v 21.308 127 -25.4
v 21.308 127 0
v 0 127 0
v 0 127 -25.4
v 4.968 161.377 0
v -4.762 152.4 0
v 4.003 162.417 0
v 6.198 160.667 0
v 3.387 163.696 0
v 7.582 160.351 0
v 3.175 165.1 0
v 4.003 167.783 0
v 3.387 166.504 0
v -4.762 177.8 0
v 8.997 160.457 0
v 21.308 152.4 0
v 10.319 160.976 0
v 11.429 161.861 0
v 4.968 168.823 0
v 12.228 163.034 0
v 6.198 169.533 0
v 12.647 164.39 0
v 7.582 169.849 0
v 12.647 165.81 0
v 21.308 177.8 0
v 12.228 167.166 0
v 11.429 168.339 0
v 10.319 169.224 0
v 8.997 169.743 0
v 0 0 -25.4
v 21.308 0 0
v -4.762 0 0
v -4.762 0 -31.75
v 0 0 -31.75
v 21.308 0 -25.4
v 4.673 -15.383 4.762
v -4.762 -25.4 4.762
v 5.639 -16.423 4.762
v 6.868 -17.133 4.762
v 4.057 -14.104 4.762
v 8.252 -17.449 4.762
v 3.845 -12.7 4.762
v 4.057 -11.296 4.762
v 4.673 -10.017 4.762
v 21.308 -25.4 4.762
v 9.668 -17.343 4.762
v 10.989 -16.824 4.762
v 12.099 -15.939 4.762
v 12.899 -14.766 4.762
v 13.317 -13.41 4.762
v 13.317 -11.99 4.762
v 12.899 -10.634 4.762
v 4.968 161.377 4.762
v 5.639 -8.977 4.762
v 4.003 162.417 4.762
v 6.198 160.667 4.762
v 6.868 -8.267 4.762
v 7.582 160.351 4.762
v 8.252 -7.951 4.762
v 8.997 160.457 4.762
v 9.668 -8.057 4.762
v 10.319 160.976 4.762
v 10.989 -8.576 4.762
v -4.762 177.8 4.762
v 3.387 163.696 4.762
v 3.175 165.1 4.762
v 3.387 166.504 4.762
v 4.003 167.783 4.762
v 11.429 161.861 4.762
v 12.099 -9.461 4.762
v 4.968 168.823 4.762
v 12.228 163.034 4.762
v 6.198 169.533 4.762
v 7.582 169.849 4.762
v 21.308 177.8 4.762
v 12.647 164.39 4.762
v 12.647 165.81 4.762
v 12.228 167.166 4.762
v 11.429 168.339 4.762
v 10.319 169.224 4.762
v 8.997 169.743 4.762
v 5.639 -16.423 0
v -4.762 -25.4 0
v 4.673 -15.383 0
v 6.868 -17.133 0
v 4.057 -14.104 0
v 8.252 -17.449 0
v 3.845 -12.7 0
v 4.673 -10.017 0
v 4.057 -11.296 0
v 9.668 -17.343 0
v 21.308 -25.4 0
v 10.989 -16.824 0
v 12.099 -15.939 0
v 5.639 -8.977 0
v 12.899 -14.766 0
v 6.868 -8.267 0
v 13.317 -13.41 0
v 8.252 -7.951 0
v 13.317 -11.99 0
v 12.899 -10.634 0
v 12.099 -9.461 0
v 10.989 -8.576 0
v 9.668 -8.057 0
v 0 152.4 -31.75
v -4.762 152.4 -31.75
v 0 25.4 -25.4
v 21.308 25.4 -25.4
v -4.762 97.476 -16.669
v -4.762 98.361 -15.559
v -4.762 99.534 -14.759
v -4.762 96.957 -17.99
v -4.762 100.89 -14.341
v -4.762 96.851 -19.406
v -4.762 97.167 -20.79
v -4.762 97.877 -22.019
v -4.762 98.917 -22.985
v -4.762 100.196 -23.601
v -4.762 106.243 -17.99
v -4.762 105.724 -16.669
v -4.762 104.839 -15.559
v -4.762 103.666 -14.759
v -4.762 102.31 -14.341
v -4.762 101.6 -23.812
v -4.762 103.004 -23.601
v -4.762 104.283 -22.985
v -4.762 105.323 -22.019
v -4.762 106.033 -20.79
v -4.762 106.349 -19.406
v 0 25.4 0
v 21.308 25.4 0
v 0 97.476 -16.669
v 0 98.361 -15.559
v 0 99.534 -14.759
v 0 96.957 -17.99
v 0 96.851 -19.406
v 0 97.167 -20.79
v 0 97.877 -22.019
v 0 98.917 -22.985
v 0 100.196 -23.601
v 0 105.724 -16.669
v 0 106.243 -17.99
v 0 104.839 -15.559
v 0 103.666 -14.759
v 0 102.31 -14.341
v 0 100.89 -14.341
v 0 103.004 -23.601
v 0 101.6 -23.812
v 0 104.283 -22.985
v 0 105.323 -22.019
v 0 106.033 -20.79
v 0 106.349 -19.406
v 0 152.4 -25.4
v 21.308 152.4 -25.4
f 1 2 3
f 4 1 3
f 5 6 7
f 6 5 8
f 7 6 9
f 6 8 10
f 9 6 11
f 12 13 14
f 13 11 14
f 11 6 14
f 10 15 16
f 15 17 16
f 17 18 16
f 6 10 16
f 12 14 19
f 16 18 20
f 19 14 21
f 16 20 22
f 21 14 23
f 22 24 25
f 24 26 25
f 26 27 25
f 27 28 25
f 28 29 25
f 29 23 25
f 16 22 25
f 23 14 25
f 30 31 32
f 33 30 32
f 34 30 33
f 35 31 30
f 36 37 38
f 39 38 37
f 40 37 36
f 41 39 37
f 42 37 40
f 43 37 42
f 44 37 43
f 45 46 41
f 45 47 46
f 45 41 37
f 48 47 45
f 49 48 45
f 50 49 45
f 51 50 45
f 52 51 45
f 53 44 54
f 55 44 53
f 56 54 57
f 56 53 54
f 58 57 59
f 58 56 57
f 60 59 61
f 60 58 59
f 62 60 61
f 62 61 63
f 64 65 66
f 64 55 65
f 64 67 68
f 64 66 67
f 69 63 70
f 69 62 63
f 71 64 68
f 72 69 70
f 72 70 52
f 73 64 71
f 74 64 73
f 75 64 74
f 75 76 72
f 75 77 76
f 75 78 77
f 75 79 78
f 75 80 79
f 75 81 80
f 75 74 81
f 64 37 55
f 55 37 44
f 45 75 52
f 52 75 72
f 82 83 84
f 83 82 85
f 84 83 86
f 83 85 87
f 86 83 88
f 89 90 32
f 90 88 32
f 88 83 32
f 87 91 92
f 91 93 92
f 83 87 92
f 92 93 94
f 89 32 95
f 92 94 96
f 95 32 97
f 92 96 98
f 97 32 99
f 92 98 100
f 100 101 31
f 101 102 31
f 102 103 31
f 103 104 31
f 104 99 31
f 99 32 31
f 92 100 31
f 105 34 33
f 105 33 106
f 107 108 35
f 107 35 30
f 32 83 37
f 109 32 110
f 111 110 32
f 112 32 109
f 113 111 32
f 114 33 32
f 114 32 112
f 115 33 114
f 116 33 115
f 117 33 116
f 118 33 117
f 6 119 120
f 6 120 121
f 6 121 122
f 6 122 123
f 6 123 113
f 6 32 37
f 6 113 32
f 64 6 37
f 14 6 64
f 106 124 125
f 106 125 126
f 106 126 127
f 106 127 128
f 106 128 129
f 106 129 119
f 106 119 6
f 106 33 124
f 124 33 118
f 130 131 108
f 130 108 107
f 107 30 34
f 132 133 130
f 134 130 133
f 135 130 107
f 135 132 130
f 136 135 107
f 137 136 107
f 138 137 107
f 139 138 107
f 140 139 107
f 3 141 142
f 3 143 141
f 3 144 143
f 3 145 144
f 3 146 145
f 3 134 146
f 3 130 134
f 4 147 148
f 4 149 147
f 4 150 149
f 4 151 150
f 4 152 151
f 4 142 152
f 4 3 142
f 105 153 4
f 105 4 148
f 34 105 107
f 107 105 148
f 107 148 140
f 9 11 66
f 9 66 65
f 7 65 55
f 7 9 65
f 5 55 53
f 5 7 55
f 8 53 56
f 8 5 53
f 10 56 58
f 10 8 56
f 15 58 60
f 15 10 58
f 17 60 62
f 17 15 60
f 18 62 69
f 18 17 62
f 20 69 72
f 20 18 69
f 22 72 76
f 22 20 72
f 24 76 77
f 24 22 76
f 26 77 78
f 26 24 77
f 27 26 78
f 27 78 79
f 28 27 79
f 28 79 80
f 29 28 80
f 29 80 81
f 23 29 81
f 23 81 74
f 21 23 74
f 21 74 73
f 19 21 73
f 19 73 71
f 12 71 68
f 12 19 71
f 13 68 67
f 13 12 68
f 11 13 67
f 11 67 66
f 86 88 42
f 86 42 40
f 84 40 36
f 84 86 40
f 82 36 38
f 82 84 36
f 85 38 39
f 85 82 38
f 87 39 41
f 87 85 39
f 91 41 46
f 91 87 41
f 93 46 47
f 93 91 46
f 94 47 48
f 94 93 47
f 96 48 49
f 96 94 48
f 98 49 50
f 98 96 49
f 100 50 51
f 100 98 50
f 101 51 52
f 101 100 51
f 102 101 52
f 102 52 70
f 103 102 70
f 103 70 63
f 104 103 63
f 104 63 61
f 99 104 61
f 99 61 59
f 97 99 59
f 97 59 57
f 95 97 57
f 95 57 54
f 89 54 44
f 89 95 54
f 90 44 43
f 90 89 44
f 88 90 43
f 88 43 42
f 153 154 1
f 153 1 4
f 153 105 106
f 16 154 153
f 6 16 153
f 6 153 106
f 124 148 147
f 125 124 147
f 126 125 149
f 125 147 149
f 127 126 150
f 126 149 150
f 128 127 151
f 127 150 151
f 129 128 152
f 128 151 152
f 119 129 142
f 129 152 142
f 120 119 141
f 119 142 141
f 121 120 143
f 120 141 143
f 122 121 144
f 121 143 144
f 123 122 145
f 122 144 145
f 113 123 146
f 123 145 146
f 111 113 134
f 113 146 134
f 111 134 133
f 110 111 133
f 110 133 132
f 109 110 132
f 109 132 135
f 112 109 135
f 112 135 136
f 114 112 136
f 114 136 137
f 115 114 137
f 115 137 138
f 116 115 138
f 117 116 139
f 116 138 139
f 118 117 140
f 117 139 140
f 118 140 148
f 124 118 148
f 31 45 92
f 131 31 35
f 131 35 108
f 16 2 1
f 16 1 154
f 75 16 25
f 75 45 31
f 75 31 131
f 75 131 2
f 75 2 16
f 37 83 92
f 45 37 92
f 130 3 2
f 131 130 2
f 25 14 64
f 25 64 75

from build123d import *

# Parameters (mm, degrees)
SKETCH2_W           = 31.75
SKETCH2_H           = 152.4
SKETCH2_R           = 4.7625
BOSS_EXTRUDE1_DEPTH = 4.7625
SKETCH3_W           = 26.07038402
SKETCH3_H           = 203.2
SKETCH3_R           = 4.7625
BOSS_EXTRUDE2_DEPTH = 4.7625
SKETCH4_W           = 21.30788402
SKETCH4_H           = 25.4
BOSS_EXTRUDE3_DEPTH = 25.4


with BuildPart() as part:
    # Sketch2 → Boss-Extrude1 (new body)
    with BuildSketch(Plane(origin=(0, 0, 0), x_dir=(0, 0, -1), z_dir=(1, 0, 0))):
        with Locations((15.875, 76.2)):
            Rectangle(SKETCH2_W, SKETCH2_H)
        with Locations((19.05, 101.6)):
            Circle(SKETCH2_R, mode=Mode.SUBTRACT)
    extrude(amount=-BOSS_EXTRUDE1_DEPTH)

    # Sketch3 → Boss-Extrude2 (add)
    with BuildSketch(Plane.XY):
        with Locations((8.27269201, 76.2)):
            Rectangle(SKETCH3_W, SKETCH3_H)
        with Locations(Location((7.9375, 165.1, 0), (0, 0, 180))):
            Circle(SKETCH3_R, mode=Mode.SUBTRACT)
        with Locations(Location((8.60788402, -12.7, 0), (0, 0, 180))):
            Circle(SKETCH3_R, mode=Mode.SUBTRACT)
    extrude(amount=BOSS_EXTRUDE2_DEPTH)

    # Sketch4 → Boss-Extrude3 (add)
    with BuildSketch(Plane(origin=(0, 0, 0), x_dir=(-1, 0, 0), z_dir=(0, 0, -1))):
        with Locations((-10.65394201, 139.7)):
            Rectangle(SKETCH4_W, SKETCH4_H)
        with Locations((-10.65394201, 12.7)):
            Rectangle(SKETCH4_W, SKETCH4_H)
    extrude(amount=BOSS_EXTRUDE3_DEPTH)


solid = part.part
